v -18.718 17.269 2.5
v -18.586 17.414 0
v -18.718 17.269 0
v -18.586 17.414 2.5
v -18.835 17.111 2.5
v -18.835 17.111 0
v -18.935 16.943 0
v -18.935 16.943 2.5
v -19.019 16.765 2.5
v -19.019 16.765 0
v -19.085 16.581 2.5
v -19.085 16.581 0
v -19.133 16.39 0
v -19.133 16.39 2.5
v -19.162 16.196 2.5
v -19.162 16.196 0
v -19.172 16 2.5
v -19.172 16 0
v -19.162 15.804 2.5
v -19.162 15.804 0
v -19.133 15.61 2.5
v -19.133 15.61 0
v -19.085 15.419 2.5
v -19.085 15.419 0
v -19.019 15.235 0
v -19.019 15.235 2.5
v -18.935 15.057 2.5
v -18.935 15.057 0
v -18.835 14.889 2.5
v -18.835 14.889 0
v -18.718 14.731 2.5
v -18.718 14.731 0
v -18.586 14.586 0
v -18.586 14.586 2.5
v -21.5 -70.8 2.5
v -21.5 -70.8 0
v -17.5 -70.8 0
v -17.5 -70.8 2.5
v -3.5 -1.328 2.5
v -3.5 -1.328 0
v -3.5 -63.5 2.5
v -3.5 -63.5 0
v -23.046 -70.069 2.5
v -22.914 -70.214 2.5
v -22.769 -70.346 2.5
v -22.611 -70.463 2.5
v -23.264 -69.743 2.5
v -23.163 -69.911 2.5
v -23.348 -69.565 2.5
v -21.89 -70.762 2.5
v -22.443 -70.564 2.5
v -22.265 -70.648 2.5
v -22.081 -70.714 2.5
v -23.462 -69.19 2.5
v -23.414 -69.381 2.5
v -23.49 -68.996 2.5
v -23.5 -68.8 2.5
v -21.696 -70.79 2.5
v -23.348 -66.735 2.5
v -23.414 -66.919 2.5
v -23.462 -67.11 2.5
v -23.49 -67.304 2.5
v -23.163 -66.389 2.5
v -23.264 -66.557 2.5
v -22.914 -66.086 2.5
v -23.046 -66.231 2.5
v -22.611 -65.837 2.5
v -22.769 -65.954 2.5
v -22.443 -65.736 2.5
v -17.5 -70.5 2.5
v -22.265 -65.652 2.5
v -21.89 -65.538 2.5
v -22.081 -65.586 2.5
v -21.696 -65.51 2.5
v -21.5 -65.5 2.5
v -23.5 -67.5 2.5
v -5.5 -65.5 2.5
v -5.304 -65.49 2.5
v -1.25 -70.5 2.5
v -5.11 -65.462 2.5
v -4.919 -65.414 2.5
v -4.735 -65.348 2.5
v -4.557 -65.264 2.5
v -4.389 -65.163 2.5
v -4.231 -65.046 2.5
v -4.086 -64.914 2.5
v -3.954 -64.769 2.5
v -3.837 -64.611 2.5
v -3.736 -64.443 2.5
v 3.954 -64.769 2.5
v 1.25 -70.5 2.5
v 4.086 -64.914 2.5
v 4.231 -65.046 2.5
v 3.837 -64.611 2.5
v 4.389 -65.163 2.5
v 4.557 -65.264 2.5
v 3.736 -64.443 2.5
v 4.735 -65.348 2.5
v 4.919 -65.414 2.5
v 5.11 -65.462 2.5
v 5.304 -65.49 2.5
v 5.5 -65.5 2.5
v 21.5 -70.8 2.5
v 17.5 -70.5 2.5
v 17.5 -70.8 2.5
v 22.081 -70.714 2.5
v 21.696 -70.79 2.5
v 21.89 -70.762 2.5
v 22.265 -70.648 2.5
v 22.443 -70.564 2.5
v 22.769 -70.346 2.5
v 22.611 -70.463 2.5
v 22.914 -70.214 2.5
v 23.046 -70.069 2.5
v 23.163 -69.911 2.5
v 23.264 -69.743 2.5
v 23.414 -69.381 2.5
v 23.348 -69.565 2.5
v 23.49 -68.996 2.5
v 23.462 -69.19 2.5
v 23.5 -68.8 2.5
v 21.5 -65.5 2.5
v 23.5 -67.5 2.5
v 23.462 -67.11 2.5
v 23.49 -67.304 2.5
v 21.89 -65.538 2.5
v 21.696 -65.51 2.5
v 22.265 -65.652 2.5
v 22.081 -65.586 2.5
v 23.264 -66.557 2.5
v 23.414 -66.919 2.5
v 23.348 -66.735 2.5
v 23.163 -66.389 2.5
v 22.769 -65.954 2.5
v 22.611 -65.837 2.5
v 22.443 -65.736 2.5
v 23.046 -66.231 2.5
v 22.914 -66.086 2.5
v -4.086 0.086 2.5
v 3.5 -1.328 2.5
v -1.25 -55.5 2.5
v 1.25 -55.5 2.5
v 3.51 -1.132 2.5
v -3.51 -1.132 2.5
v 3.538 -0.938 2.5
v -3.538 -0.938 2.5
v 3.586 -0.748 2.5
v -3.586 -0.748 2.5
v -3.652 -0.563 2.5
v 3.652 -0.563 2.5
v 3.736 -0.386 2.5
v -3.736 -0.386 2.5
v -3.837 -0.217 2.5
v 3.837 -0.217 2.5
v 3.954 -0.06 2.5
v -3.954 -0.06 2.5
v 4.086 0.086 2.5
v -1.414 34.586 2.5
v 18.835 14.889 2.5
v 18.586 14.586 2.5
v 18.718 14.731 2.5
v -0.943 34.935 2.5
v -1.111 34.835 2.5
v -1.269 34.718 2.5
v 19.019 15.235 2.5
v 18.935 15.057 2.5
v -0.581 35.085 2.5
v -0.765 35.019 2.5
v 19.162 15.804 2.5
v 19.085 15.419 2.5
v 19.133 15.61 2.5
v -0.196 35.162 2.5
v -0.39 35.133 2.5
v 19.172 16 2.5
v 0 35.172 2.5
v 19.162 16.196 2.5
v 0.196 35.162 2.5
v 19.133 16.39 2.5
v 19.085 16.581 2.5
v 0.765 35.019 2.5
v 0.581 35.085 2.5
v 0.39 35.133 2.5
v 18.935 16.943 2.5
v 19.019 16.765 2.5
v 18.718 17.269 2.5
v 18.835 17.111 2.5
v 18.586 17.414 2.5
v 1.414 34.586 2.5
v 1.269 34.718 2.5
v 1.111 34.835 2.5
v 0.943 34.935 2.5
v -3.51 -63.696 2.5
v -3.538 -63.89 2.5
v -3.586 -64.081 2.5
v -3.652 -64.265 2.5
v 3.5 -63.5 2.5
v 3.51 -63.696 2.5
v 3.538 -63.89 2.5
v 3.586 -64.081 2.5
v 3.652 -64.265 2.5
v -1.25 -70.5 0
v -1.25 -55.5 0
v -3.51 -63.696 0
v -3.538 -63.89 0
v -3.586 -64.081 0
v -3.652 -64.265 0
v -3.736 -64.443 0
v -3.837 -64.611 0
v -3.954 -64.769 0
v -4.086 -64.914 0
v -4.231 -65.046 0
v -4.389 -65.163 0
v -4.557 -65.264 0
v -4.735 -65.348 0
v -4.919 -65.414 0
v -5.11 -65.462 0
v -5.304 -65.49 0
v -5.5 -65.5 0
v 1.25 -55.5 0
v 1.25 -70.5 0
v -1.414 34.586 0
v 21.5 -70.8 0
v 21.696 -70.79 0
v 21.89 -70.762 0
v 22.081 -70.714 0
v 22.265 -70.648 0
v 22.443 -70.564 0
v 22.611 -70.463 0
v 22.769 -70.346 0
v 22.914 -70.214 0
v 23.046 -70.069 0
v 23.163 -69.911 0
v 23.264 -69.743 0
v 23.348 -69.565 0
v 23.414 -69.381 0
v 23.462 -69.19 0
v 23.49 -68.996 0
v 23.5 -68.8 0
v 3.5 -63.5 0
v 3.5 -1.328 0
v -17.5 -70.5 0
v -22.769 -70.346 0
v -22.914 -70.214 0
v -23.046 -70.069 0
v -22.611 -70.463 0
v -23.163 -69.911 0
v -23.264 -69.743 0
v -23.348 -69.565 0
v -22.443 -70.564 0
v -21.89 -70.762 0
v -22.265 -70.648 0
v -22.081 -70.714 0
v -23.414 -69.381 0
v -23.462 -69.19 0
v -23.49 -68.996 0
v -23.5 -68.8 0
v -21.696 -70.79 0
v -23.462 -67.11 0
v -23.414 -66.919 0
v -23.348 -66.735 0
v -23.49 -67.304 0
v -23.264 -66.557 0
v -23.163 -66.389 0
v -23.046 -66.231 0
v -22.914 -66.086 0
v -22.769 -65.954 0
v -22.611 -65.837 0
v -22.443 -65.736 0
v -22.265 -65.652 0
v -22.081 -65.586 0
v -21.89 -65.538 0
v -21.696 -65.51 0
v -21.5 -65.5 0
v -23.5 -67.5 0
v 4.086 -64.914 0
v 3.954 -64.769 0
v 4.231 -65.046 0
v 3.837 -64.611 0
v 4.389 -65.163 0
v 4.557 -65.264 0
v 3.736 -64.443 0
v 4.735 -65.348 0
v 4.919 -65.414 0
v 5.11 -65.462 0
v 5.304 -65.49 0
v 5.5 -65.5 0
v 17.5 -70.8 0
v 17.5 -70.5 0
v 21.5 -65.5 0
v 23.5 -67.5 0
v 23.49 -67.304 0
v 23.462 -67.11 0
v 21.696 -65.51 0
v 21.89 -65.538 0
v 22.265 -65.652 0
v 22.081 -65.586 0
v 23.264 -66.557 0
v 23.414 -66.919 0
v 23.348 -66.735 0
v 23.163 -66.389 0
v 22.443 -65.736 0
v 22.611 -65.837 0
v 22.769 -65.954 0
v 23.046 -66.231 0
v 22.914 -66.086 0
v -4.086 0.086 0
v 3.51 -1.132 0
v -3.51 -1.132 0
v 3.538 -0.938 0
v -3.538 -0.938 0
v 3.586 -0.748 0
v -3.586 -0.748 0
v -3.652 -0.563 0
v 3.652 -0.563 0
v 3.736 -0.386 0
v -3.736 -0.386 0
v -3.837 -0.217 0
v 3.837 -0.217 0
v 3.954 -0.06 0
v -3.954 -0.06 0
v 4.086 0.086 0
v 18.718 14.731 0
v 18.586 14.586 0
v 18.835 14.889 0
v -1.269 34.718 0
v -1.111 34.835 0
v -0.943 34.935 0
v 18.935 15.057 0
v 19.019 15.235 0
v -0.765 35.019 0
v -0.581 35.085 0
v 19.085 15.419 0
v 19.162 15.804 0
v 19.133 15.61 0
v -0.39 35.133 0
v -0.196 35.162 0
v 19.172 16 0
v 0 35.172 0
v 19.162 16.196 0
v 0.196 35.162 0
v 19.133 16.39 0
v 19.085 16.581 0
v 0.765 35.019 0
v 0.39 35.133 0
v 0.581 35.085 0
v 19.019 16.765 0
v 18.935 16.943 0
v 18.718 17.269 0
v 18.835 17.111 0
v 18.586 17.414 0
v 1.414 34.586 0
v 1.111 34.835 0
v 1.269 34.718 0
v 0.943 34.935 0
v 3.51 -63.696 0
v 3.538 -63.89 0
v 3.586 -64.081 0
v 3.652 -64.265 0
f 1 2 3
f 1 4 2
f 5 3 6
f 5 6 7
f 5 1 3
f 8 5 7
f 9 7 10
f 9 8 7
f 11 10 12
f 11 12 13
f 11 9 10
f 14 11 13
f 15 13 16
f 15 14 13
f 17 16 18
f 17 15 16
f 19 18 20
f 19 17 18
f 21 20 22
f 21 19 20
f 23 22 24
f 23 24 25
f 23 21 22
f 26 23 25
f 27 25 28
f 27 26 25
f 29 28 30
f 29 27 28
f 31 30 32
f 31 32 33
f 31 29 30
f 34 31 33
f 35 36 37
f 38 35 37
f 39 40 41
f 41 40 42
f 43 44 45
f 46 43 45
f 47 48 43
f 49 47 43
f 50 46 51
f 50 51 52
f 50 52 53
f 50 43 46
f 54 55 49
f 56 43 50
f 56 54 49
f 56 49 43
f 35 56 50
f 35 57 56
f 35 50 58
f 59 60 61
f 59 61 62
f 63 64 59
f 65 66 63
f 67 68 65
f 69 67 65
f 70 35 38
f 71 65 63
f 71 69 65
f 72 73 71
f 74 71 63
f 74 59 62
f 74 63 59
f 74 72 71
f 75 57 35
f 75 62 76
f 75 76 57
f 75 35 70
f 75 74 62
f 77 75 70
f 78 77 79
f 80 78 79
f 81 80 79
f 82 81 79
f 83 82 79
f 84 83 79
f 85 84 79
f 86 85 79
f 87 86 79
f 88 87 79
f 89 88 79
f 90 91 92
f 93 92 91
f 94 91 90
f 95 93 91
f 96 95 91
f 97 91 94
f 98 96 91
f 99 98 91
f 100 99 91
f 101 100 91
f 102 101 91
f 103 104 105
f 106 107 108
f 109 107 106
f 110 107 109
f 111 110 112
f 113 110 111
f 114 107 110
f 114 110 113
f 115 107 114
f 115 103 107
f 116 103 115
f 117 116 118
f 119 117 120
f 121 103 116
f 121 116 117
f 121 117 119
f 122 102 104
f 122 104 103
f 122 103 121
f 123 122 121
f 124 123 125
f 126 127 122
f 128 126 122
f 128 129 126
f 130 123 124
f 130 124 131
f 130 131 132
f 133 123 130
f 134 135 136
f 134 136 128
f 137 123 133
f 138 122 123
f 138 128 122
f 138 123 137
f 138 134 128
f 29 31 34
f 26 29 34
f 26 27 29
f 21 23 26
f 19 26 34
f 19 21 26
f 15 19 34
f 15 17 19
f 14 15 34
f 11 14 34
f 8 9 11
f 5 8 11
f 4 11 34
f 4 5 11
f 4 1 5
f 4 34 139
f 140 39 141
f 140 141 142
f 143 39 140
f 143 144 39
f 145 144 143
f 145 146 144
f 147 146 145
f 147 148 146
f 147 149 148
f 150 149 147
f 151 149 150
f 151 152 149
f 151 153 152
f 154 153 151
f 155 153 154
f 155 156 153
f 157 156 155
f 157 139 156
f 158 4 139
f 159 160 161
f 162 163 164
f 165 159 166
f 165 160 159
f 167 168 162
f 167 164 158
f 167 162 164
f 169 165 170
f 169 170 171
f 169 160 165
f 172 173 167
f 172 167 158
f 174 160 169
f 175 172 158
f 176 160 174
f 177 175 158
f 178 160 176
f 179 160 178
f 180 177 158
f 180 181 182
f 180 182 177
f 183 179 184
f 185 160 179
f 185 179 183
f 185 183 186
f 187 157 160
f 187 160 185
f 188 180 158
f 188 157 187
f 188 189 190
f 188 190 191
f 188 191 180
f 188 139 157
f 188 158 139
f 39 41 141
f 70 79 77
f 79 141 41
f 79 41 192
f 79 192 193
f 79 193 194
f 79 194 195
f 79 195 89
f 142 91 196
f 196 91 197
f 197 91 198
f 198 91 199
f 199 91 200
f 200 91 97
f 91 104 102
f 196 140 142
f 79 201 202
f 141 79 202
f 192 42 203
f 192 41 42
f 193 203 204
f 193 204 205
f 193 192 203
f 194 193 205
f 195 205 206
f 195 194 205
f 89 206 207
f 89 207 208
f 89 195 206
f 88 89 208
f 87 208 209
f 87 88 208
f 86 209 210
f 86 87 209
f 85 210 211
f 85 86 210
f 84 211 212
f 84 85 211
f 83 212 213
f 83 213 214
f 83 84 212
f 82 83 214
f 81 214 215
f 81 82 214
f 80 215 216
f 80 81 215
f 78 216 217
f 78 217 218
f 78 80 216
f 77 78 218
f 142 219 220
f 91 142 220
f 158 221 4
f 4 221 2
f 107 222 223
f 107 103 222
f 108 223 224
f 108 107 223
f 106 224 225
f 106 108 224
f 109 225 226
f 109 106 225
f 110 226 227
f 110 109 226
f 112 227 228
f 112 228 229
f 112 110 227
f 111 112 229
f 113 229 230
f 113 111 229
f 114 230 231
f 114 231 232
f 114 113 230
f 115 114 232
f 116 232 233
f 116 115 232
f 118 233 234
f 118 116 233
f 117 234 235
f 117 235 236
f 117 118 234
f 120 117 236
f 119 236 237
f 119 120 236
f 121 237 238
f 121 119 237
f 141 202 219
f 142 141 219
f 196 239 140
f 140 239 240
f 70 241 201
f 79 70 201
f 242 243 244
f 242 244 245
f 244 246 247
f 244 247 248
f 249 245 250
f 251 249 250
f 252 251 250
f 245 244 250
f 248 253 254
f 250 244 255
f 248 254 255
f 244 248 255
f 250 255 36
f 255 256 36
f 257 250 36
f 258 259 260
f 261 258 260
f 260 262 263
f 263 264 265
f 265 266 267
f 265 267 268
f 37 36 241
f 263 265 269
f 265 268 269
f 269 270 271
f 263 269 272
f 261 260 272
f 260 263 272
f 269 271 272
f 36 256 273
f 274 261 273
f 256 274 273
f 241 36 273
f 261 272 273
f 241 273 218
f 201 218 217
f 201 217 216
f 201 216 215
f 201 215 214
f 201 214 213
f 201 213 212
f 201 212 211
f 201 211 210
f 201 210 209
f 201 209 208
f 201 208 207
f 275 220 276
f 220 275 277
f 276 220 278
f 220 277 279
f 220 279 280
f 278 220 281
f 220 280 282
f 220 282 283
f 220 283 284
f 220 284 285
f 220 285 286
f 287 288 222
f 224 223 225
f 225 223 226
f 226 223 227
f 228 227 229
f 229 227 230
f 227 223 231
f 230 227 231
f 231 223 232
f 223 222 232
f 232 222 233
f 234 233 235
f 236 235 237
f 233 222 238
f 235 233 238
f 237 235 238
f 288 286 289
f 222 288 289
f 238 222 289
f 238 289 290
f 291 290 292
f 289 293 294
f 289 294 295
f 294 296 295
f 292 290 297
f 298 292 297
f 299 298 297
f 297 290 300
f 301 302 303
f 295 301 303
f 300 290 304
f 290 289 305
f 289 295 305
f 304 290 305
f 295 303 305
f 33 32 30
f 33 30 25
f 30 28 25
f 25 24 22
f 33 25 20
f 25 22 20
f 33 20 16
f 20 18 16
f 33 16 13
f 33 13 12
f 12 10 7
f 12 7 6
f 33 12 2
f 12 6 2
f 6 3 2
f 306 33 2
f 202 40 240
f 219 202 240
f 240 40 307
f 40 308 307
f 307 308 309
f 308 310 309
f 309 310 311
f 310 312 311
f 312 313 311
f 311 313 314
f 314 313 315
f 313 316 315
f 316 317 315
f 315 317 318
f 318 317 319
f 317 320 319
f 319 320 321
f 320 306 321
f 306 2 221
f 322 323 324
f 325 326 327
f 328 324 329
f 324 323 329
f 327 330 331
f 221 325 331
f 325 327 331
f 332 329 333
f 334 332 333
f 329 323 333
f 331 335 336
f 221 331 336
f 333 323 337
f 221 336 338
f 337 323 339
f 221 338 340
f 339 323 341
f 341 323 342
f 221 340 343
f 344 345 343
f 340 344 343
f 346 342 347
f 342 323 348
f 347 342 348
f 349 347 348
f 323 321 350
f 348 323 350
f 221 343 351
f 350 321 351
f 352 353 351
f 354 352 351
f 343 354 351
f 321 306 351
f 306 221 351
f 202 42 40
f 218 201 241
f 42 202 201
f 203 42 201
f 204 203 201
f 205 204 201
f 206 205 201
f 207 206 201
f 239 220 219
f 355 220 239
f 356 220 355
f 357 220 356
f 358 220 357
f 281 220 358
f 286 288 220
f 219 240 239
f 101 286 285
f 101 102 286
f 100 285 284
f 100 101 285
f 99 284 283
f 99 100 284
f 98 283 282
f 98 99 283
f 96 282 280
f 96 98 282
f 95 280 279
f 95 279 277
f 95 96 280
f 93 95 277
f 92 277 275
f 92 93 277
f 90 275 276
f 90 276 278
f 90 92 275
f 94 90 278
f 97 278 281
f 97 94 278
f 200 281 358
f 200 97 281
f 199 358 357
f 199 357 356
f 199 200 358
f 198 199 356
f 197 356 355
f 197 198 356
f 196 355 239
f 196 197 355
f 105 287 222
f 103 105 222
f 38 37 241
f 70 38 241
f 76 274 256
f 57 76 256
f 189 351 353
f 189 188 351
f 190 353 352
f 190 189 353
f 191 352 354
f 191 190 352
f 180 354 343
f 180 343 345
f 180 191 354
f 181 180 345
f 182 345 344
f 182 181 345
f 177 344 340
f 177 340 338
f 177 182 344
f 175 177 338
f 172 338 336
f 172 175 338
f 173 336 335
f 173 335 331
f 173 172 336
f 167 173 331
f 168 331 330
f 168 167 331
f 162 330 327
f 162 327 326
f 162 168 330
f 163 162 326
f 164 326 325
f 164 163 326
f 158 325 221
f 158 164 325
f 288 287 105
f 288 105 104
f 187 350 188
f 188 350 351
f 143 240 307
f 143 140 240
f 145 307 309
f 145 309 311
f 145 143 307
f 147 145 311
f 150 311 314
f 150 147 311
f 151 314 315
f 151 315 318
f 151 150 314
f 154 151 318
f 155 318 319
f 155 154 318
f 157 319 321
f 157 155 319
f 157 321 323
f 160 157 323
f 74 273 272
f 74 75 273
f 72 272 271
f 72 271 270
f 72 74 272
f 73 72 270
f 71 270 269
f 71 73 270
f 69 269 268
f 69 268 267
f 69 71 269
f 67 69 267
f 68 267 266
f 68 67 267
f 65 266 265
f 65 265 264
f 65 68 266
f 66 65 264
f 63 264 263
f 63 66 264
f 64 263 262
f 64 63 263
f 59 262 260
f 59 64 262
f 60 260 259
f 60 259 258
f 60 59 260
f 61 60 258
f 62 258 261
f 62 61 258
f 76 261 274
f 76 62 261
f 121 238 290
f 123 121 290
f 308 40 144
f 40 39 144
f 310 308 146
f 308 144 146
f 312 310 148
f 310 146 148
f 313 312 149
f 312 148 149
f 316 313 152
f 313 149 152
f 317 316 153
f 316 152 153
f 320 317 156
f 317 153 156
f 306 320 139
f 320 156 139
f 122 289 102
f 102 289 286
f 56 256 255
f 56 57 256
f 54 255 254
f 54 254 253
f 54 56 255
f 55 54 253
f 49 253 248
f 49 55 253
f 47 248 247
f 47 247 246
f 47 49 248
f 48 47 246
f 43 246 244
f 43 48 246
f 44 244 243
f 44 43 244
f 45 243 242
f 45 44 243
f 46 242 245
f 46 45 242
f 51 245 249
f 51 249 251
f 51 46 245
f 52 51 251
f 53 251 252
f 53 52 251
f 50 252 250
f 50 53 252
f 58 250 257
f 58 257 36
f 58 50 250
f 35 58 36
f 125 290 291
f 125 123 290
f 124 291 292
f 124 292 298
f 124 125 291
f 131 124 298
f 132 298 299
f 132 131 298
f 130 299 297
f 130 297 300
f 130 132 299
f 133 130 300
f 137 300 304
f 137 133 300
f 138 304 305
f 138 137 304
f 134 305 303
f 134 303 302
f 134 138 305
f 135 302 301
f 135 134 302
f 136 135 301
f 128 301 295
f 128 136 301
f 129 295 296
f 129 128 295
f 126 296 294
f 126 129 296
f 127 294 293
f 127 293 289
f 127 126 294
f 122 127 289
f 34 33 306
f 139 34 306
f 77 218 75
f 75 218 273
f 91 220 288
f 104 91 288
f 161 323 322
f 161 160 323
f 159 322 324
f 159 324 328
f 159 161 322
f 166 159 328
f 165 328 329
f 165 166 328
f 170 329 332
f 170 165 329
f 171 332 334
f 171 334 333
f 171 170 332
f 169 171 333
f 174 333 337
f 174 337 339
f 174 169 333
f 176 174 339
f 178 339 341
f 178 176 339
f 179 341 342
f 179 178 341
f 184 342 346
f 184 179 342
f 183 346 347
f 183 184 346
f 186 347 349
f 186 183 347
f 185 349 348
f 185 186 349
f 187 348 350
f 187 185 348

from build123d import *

# Parameters (mm, degrees)
F0_W     = 6
F0_H     = 0.3
F1_DEPTH = 2.5
F2_R     = 2


# Not quite as in the source:
# - a feature names something its author has since deleted; it is built from what else it names


with BuildPart() as f1:
    # F0 (on Top) → F1 (new body)
    with BuildSketch(Plane.XY):
        Polygon((0, -4), (-3.5, -0.5), (-3.5, -65.5), (-23.5, -65.5), (-23.5, -70.5), (-17.5, -70.5), (-1.25, -70.5), (-1.25, -55.5), (1.25, -55.5), (1.25, -70.5), (17.5, -70.5), (23.5, -70.5), (23.5, -65.5), (3.5, -65.5), (3.5, -0.5), align=None)
        with Locations((-20.5, -70.65)):
            Rectangle(F0_W, F0_H)
        with Locations((20.5, -70.65)):
            Rectangle(F0_W, F0_H)
        Polygon((-20, 16), (-3.5, -0.5), (0, -4), (3.5, -0.5), (20, 16), (0, 36), align=None)
    extrude(amount=F1_DEPTH)

    # F2
    f2_edges = [f1.edges().sort_by_distance(p)[0] for p in [
        (3.5, -65.5, 1.25),
        (-3.5, -65.5, 1.25),
        (-23.5, -65.5, 1.25),
        (23.5, -65.5, 1.25),
        (-23.5, -70.8, 1.25),
        (23.5, -70.8, 1.25),
        (20, 16, 1.25),
        (0, 36, 1.25),
        (-20, 16, 1.25),
        (3.5, -0.5, 1.25),
        (-3.5, -0.5, 1.25),
    ]]
    fillet(f2_edges, radius=F2_R)


solid = f1.part
